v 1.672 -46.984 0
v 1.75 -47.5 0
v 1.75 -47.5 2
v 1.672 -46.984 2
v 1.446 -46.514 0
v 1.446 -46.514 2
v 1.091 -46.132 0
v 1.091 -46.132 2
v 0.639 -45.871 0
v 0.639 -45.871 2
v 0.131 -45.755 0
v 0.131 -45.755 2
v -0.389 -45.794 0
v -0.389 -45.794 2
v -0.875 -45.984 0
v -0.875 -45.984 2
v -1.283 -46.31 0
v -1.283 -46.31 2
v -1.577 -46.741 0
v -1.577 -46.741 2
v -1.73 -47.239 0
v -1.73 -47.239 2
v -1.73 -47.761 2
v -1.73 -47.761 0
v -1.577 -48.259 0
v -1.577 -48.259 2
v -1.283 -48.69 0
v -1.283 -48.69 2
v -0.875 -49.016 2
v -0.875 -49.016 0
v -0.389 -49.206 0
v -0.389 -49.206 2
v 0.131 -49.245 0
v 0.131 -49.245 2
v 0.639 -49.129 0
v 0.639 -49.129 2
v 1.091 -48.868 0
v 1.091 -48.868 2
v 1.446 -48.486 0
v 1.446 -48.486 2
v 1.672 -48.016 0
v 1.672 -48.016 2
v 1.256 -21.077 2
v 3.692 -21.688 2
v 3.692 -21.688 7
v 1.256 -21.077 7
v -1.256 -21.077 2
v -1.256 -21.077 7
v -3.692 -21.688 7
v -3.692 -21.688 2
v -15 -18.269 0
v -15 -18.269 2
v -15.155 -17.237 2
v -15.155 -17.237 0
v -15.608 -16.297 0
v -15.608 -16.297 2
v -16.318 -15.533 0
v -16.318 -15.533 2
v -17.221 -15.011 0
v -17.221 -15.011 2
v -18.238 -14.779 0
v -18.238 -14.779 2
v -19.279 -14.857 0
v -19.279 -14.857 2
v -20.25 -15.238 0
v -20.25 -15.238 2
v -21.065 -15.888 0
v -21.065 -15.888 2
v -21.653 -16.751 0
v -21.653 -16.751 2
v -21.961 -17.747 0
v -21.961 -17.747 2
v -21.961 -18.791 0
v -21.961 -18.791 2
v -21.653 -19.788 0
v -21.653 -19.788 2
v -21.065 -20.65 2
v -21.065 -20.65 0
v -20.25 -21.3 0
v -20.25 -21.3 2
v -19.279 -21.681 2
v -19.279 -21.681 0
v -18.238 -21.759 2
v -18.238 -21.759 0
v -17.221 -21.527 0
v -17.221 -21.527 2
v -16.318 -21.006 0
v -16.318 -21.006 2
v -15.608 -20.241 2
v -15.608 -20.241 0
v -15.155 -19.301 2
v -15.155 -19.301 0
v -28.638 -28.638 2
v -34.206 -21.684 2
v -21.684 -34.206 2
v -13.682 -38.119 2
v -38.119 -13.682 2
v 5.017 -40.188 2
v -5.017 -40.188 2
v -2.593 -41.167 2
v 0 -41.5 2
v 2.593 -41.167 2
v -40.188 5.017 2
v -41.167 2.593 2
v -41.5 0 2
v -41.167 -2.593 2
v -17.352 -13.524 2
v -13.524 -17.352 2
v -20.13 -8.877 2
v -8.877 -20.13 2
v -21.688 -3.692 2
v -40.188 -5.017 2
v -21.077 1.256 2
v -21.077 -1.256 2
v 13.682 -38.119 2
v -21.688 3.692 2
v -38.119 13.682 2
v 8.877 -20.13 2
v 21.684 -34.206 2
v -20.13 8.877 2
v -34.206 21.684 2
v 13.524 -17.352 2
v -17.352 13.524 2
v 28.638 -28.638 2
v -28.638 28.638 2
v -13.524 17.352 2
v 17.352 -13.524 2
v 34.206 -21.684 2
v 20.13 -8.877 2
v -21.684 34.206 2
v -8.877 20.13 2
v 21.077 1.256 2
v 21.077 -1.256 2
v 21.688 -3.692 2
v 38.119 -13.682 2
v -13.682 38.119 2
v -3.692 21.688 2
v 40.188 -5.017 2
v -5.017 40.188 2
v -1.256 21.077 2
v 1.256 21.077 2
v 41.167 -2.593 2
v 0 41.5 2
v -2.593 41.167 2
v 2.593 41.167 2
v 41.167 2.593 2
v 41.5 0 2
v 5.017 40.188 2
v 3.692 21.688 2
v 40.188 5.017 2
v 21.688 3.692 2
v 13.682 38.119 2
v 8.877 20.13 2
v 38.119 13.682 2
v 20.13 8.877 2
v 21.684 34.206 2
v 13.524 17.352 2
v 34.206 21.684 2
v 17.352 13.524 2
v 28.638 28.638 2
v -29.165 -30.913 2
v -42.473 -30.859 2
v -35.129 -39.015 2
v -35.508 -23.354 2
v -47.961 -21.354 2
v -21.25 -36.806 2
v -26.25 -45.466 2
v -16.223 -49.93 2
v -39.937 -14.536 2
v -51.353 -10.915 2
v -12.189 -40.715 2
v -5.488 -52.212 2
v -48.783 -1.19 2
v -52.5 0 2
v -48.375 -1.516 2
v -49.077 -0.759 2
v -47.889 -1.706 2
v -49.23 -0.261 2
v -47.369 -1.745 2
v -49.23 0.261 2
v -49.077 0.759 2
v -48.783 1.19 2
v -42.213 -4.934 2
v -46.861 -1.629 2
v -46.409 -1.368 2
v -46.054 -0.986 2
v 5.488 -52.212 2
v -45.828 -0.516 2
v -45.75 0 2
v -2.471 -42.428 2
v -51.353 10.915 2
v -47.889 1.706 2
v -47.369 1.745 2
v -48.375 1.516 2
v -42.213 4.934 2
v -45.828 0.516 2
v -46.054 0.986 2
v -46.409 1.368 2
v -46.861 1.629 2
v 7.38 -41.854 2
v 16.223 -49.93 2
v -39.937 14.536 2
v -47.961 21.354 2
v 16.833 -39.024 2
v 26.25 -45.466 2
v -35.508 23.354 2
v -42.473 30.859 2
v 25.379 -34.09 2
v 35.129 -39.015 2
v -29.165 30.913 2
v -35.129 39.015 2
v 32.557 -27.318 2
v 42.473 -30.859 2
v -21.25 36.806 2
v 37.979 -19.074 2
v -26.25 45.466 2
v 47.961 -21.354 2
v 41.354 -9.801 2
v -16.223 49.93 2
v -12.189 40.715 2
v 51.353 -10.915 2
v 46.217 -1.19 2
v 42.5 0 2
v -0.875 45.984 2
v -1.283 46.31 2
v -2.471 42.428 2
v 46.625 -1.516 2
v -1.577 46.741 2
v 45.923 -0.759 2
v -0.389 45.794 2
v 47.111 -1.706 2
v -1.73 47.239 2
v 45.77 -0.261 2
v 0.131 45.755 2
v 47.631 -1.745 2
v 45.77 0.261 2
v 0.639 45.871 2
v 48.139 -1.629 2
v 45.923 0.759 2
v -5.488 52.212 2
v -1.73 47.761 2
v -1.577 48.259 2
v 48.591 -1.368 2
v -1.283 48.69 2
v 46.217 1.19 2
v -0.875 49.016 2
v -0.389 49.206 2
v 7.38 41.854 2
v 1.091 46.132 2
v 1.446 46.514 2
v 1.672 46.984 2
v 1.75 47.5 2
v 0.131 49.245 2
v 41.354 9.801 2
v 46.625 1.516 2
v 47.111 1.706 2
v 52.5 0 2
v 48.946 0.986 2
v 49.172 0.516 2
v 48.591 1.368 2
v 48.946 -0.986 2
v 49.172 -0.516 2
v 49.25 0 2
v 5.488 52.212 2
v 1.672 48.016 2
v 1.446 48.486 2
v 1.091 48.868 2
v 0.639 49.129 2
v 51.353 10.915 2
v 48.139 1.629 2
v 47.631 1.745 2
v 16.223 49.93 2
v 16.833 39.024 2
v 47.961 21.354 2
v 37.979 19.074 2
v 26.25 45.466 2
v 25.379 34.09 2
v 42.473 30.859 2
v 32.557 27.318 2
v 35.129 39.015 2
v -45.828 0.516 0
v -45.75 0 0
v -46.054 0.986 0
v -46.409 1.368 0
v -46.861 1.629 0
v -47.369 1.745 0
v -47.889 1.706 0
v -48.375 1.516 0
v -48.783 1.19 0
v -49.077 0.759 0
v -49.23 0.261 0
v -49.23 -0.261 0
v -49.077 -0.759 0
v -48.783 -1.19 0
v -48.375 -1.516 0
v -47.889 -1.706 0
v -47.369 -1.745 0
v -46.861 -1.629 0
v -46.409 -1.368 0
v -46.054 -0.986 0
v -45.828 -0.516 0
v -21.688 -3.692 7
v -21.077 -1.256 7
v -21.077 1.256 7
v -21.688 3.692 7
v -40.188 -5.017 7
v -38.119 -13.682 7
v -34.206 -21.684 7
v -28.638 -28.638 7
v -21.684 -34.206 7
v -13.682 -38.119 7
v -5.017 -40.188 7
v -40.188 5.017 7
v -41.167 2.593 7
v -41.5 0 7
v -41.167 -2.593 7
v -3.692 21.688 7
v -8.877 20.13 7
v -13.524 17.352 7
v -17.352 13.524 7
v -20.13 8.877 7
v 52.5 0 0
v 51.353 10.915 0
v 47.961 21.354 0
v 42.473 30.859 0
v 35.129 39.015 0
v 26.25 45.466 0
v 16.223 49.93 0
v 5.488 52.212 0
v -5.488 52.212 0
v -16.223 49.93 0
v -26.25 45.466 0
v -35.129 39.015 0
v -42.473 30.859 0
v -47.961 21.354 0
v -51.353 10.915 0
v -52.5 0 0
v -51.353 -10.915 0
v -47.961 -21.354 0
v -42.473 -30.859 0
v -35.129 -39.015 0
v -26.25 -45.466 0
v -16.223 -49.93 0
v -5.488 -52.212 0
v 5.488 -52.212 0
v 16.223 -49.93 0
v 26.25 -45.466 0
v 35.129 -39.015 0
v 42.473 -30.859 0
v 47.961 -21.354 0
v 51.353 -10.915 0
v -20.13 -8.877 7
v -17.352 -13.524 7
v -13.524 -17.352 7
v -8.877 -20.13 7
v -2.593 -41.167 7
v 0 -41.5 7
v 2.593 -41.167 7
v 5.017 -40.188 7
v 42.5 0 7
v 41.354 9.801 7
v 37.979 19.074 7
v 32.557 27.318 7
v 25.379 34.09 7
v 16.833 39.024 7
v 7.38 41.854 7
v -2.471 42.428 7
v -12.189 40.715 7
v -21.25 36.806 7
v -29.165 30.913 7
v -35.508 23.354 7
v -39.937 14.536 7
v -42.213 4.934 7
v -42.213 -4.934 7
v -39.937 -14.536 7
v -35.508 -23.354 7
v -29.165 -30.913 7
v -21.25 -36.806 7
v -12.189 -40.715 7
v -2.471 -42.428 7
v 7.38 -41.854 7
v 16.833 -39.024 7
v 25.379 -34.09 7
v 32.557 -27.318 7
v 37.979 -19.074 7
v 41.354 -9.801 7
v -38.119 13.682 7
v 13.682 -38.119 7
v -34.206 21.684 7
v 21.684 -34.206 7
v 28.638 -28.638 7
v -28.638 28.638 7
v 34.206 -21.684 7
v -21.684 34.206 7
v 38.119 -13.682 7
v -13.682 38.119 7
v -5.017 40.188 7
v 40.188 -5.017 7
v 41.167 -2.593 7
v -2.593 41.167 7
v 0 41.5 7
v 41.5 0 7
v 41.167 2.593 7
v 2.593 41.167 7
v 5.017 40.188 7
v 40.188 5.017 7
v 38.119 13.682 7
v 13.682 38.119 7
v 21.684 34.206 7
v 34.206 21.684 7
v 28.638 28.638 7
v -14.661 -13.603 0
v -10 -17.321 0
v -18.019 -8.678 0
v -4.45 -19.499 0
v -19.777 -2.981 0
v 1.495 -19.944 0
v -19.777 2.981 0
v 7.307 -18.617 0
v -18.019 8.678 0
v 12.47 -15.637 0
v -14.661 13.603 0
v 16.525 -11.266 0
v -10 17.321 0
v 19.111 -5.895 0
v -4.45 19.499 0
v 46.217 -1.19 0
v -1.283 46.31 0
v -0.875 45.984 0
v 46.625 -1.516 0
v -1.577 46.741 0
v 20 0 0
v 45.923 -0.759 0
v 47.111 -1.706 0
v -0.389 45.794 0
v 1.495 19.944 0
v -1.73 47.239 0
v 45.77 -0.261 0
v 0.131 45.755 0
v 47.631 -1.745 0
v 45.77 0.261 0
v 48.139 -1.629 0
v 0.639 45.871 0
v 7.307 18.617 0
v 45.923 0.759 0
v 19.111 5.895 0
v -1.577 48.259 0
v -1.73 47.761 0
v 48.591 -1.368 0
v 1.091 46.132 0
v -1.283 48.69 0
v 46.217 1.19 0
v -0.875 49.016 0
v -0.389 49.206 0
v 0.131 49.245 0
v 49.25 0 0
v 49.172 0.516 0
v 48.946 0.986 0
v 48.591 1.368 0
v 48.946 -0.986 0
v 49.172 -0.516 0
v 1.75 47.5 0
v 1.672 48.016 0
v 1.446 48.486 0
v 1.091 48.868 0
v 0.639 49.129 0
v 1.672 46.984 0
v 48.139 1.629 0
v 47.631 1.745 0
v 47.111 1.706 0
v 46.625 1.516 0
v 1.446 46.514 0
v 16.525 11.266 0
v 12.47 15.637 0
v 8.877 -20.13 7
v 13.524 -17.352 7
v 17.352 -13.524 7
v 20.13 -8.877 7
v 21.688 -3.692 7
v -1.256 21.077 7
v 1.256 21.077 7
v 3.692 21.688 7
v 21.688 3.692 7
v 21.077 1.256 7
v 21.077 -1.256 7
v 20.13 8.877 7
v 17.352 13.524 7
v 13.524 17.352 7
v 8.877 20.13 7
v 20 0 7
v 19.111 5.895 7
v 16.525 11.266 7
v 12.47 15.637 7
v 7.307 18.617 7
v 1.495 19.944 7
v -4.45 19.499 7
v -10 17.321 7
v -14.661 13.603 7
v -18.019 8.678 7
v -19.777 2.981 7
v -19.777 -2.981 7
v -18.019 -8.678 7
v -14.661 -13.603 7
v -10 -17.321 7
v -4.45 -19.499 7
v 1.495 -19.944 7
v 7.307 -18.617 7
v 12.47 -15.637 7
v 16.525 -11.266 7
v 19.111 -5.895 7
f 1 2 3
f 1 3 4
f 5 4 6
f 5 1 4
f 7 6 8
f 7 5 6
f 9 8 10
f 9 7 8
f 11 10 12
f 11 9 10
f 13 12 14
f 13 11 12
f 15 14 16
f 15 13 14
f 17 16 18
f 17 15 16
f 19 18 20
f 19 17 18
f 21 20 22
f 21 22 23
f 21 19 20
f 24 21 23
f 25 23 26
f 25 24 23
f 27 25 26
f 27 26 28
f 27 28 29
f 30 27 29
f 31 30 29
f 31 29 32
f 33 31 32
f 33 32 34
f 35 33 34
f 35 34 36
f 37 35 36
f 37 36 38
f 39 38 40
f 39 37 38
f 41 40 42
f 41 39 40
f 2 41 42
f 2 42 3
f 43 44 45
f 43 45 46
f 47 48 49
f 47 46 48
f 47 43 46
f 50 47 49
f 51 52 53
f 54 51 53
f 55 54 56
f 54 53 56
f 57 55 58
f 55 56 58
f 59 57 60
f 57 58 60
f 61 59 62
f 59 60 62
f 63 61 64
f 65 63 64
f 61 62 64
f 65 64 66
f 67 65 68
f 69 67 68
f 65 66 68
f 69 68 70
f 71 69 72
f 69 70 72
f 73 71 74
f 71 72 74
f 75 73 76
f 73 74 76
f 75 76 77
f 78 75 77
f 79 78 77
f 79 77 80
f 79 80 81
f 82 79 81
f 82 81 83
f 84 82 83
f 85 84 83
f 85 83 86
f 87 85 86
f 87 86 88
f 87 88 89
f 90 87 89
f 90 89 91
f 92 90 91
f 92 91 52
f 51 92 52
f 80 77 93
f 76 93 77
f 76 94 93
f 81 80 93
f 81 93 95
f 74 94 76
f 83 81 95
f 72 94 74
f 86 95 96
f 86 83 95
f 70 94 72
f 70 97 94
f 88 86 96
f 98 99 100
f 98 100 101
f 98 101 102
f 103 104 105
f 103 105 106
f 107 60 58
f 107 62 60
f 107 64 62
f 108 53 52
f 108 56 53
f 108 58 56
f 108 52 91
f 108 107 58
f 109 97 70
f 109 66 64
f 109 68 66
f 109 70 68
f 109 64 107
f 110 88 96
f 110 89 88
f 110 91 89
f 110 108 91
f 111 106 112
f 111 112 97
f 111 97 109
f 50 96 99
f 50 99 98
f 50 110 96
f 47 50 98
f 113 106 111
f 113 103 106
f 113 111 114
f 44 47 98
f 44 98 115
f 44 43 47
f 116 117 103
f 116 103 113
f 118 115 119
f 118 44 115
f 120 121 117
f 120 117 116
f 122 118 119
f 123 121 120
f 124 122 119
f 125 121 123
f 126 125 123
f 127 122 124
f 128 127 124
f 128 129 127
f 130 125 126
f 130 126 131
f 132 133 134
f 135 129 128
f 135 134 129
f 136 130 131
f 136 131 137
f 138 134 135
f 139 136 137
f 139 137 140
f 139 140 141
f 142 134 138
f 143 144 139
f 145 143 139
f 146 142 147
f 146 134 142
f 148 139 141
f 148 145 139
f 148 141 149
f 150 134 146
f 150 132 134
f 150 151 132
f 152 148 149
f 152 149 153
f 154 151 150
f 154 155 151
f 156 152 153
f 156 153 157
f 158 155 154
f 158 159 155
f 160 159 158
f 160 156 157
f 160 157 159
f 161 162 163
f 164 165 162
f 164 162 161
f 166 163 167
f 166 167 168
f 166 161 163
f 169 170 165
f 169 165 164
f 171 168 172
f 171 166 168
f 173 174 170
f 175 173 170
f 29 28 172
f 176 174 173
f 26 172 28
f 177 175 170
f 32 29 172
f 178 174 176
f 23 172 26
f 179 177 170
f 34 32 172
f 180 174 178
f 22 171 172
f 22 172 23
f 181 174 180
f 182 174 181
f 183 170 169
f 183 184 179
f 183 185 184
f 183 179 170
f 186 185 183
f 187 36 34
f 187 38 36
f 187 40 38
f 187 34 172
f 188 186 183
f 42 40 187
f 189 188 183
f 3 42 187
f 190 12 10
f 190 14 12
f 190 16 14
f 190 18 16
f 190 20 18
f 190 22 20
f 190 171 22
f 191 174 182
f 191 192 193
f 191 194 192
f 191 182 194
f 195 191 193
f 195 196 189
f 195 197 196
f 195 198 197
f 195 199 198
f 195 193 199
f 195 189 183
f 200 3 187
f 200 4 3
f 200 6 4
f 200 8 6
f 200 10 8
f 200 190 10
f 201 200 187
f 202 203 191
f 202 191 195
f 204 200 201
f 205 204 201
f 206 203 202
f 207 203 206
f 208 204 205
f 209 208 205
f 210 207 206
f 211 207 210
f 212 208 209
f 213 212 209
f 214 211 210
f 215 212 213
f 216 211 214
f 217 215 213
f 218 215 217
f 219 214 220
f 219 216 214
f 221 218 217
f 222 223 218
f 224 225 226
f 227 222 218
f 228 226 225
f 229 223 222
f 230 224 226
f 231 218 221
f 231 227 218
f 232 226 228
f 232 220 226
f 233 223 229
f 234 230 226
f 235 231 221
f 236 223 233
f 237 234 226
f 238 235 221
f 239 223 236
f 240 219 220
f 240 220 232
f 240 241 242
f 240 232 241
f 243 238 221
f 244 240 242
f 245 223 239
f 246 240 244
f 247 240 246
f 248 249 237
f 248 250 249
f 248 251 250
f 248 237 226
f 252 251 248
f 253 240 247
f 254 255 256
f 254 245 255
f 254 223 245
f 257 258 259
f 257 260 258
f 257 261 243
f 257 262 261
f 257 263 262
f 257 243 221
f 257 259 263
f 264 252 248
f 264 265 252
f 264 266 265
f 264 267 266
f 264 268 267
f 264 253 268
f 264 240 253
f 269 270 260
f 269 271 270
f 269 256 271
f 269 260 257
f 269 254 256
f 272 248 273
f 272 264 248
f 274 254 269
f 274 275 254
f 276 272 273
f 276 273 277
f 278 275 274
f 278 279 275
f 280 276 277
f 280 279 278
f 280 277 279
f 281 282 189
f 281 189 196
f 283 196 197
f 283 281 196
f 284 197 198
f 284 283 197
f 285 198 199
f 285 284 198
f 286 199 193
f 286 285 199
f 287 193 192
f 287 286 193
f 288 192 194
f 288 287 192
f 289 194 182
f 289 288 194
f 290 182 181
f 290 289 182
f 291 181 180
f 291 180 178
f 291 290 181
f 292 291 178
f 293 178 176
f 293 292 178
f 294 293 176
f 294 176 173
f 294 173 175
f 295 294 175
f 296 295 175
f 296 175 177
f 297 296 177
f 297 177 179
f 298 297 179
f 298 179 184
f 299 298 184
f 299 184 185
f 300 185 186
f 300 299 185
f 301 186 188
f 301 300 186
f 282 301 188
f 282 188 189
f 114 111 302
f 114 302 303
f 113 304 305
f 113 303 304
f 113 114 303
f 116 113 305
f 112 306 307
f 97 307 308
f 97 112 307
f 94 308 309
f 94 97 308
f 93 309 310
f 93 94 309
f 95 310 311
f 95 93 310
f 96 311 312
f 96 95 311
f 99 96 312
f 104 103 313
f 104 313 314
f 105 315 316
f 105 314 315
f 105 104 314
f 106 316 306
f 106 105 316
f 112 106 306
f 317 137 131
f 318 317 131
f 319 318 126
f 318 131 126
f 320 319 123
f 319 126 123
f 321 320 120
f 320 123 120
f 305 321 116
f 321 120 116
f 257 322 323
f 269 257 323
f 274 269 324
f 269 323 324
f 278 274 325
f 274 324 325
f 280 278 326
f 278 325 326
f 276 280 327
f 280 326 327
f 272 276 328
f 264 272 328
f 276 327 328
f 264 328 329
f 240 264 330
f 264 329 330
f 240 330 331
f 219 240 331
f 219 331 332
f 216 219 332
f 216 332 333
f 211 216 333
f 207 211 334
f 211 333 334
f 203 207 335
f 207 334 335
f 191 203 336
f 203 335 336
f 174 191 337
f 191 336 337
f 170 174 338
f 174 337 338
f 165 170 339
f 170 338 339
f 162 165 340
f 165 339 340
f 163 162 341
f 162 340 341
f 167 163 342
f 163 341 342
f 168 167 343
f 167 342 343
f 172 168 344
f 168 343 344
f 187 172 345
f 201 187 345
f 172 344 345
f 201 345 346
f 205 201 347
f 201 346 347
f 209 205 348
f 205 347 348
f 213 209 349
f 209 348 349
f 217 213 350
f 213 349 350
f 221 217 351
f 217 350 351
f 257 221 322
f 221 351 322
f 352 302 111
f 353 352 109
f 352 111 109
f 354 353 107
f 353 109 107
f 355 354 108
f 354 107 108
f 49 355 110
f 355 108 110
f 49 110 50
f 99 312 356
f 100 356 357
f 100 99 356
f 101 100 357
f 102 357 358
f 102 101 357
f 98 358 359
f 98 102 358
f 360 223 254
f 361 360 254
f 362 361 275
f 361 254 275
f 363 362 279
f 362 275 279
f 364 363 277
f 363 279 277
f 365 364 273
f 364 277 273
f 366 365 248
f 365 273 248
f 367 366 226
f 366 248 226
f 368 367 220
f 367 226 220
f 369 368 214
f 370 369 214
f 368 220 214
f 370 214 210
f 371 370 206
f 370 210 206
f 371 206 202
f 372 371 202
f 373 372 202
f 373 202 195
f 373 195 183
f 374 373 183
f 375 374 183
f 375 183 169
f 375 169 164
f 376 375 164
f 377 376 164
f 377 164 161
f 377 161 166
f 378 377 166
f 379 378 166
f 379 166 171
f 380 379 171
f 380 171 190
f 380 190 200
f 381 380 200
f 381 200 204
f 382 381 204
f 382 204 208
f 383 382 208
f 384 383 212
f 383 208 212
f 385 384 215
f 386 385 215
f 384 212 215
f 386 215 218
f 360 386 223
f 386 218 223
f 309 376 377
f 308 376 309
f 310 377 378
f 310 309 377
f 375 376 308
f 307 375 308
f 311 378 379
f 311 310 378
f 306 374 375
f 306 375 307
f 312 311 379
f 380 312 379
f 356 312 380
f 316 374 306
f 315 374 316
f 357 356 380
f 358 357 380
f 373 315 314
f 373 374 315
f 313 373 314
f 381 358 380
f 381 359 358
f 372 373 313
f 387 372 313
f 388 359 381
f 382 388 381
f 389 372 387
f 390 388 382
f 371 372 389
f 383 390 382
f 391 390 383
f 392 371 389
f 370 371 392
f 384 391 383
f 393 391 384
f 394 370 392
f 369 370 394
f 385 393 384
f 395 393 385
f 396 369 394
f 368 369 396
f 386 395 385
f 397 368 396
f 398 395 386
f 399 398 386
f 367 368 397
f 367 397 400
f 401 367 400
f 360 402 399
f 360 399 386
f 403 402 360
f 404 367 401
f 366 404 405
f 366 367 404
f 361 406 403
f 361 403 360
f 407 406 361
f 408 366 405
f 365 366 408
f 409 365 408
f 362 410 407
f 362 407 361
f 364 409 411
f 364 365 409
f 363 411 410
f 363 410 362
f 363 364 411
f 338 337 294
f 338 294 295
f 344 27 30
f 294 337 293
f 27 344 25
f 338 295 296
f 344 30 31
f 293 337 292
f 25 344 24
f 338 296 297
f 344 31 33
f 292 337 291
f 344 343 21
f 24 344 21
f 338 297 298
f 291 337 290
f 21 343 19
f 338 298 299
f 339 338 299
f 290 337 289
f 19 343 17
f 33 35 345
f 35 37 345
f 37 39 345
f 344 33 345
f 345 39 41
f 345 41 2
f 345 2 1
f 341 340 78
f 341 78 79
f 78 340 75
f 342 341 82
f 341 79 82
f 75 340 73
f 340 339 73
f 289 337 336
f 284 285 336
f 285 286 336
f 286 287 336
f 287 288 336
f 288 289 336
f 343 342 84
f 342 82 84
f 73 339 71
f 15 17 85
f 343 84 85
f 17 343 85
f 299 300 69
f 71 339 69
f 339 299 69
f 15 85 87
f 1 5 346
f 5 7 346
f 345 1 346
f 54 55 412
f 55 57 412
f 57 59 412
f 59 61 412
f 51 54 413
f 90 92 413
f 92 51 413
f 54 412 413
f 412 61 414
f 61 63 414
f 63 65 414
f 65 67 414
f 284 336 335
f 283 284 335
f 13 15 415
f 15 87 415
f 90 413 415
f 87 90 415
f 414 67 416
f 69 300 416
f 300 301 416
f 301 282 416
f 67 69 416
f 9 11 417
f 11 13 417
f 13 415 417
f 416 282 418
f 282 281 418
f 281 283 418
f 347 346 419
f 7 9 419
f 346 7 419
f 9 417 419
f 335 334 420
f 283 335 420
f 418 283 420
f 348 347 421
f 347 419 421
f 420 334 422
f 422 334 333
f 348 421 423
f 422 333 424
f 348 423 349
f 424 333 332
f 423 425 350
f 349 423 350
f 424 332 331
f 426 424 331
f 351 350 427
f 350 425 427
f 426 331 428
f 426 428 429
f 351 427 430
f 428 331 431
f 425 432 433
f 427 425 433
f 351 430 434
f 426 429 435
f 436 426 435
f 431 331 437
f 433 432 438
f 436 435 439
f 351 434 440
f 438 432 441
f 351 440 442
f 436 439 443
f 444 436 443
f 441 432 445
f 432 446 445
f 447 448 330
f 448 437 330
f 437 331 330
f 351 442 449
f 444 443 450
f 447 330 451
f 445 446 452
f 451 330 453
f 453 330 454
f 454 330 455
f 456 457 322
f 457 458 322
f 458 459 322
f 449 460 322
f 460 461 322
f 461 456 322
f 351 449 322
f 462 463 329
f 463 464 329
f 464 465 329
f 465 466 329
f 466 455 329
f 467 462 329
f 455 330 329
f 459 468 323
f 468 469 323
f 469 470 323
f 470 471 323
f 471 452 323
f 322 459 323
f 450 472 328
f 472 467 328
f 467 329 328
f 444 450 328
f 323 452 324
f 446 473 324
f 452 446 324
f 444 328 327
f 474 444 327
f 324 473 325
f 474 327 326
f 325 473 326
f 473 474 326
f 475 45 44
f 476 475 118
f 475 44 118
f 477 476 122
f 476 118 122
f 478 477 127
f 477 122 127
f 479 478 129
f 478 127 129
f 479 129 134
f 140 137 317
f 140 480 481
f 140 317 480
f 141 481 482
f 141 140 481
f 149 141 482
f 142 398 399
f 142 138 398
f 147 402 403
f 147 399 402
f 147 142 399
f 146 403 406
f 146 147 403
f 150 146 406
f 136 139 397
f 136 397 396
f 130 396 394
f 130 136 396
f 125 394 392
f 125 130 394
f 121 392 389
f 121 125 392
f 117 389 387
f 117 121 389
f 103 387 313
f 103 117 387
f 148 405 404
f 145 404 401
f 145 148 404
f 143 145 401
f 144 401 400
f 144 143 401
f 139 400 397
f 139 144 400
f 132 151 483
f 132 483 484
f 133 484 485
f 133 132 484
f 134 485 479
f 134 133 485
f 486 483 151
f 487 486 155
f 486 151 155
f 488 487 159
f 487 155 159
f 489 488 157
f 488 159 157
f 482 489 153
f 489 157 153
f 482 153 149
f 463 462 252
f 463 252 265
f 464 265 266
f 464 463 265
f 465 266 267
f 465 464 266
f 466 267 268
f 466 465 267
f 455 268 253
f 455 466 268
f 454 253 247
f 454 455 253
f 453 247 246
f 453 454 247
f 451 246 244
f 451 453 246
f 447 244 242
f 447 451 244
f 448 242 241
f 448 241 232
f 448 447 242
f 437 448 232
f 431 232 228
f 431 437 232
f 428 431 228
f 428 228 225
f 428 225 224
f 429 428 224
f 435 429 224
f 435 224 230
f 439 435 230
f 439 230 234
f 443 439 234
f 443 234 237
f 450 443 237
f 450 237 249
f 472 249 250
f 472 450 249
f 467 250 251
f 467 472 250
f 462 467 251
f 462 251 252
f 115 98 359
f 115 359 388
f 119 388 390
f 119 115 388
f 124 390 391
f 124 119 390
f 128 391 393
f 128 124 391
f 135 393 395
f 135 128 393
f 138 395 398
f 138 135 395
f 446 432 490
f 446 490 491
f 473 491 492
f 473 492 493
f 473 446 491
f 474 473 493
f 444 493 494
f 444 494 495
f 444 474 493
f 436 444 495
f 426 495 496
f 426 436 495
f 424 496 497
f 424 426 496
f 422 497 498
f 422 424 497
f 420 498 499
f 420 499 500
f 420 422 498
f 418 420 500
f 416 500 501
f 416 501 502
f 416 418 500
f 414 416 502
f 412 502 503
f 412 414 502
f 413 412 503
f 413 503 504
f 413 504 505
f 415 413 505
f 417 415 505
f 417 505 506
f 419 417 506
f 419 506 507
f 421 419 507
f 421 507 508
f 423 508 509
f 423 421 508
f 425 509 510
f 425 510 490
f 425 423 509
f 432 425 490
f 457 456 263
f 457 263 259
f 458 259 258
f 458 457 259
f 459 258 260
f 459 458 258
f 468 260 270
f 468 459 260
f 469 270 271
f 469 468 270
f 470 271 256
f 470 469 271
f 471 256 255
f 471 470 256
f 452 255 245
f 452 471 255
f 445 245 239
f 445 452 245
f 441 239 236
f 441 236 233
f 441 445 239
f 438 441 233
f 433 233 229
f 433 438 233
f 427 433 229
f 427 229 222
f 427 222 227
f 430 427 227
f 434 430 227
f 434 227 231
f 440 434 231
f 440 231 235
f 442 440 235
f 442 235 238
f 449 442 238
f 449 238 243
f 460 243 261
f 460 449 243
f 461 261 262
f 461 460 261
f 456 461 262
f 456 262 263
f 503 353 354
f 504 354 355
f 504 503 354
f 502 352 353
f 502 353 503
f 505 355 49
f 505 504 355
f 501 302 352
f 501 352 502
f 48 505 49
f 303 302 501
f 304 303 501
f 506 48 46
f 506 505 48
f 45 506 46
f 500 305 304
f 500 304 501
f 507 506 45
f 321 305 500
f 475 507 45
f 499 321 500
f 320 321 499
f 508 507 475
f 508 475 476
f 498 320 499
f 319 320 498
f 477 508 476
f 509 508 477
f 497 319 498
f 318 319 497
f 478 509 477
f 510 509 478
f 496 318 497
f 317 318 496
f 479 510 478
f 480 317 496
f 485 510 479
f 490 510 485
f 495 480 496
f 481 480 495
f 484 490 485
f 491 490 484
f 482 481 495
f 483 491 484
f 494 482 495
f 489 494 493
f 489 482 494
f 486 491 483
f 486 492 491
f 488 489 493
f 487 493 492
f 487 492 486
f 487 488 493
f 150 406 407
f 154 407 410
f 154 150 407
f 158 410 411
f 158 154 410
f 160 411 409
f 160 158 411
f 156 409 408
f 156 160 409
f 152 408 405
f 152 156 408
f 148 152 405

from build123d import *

# Parameters (mm, degrees)
F0_R     = 52.5
F0_R_2   = 1.75
F0_R_3   = 42.5
F1_DEPTH = 2
F0_R_4   = 20
F2_DEPTH = 7
F3_T     = -2
F4_R     = 10.25
F5_DEPTH = 25
F6_R     = 3.5
F7_DEPTH = 25


with BuildPart() as f1:
    # F0 (on Top) → F1 (new body)
    with BuildSketch(Plane.XY):
        Circle(F0_R)
        with Locations((0, -47.5)):
            Circle(F0_R_2, mode=Mode.SUBTRACT)
        with Locations((-47.5, 0)):
            Circle(F0_R_2, mode=Mode.SUBTRACT)
        Circle(F0_R_3, mode=Mode.SUBTRACT)
        with Locations((47.5, 0)):
            Circle(F0_R_2, mode=Mode.SUBTRACT)
        with Locations((0, 47.5)):
            Circle(F0_R_2, mode=Mode.SUBTRACT)
    extrude(amount=F1_DEPTH)

    # F0 (on Top) → F2 (join)
    with BuildSketch(Plane.XY):
        Circle(F0_R_3)
        Circle(F0_R_4, mode=Mode.SUBTRACT)
    extrude(amount=F2_DEPTH)

    # F3
    f3_openings = [f1.faces().sort_by_distance(p)[0] for p in [
        (-41.297918, 0, 7),
    ]]
    offset(amount=F3_T, openings=f3_openings, kind=Kind.INTERSECTION)

    # F4 (on face) → F5 (cut)
    with BuildSketch(Plane.XY.offset(2)):
        with Locations((0, 31.25)):
            Circle(F4_R)
        with Locations((-31.25, 0)):
            Circle(F4_R)
        with Locations((0, -31.25)):
            Circle(F4_R)
        with Locations((31.25, 0)):
            Circle(F4_R)
    extrude(amount=F5_DEPTH, mode=Mode.SUBTRACT)

    # F6 (on face) → F7 (cut)
    with BuildSketch(Plane.XY.offset(2)):
        with Locations((-18.4997347846, -18.269094474)):
            Circle(F6_R)
    extrude(amount=-F7_DEPTH, mode=Mode.SUBTRACT)


solid = f1.part
